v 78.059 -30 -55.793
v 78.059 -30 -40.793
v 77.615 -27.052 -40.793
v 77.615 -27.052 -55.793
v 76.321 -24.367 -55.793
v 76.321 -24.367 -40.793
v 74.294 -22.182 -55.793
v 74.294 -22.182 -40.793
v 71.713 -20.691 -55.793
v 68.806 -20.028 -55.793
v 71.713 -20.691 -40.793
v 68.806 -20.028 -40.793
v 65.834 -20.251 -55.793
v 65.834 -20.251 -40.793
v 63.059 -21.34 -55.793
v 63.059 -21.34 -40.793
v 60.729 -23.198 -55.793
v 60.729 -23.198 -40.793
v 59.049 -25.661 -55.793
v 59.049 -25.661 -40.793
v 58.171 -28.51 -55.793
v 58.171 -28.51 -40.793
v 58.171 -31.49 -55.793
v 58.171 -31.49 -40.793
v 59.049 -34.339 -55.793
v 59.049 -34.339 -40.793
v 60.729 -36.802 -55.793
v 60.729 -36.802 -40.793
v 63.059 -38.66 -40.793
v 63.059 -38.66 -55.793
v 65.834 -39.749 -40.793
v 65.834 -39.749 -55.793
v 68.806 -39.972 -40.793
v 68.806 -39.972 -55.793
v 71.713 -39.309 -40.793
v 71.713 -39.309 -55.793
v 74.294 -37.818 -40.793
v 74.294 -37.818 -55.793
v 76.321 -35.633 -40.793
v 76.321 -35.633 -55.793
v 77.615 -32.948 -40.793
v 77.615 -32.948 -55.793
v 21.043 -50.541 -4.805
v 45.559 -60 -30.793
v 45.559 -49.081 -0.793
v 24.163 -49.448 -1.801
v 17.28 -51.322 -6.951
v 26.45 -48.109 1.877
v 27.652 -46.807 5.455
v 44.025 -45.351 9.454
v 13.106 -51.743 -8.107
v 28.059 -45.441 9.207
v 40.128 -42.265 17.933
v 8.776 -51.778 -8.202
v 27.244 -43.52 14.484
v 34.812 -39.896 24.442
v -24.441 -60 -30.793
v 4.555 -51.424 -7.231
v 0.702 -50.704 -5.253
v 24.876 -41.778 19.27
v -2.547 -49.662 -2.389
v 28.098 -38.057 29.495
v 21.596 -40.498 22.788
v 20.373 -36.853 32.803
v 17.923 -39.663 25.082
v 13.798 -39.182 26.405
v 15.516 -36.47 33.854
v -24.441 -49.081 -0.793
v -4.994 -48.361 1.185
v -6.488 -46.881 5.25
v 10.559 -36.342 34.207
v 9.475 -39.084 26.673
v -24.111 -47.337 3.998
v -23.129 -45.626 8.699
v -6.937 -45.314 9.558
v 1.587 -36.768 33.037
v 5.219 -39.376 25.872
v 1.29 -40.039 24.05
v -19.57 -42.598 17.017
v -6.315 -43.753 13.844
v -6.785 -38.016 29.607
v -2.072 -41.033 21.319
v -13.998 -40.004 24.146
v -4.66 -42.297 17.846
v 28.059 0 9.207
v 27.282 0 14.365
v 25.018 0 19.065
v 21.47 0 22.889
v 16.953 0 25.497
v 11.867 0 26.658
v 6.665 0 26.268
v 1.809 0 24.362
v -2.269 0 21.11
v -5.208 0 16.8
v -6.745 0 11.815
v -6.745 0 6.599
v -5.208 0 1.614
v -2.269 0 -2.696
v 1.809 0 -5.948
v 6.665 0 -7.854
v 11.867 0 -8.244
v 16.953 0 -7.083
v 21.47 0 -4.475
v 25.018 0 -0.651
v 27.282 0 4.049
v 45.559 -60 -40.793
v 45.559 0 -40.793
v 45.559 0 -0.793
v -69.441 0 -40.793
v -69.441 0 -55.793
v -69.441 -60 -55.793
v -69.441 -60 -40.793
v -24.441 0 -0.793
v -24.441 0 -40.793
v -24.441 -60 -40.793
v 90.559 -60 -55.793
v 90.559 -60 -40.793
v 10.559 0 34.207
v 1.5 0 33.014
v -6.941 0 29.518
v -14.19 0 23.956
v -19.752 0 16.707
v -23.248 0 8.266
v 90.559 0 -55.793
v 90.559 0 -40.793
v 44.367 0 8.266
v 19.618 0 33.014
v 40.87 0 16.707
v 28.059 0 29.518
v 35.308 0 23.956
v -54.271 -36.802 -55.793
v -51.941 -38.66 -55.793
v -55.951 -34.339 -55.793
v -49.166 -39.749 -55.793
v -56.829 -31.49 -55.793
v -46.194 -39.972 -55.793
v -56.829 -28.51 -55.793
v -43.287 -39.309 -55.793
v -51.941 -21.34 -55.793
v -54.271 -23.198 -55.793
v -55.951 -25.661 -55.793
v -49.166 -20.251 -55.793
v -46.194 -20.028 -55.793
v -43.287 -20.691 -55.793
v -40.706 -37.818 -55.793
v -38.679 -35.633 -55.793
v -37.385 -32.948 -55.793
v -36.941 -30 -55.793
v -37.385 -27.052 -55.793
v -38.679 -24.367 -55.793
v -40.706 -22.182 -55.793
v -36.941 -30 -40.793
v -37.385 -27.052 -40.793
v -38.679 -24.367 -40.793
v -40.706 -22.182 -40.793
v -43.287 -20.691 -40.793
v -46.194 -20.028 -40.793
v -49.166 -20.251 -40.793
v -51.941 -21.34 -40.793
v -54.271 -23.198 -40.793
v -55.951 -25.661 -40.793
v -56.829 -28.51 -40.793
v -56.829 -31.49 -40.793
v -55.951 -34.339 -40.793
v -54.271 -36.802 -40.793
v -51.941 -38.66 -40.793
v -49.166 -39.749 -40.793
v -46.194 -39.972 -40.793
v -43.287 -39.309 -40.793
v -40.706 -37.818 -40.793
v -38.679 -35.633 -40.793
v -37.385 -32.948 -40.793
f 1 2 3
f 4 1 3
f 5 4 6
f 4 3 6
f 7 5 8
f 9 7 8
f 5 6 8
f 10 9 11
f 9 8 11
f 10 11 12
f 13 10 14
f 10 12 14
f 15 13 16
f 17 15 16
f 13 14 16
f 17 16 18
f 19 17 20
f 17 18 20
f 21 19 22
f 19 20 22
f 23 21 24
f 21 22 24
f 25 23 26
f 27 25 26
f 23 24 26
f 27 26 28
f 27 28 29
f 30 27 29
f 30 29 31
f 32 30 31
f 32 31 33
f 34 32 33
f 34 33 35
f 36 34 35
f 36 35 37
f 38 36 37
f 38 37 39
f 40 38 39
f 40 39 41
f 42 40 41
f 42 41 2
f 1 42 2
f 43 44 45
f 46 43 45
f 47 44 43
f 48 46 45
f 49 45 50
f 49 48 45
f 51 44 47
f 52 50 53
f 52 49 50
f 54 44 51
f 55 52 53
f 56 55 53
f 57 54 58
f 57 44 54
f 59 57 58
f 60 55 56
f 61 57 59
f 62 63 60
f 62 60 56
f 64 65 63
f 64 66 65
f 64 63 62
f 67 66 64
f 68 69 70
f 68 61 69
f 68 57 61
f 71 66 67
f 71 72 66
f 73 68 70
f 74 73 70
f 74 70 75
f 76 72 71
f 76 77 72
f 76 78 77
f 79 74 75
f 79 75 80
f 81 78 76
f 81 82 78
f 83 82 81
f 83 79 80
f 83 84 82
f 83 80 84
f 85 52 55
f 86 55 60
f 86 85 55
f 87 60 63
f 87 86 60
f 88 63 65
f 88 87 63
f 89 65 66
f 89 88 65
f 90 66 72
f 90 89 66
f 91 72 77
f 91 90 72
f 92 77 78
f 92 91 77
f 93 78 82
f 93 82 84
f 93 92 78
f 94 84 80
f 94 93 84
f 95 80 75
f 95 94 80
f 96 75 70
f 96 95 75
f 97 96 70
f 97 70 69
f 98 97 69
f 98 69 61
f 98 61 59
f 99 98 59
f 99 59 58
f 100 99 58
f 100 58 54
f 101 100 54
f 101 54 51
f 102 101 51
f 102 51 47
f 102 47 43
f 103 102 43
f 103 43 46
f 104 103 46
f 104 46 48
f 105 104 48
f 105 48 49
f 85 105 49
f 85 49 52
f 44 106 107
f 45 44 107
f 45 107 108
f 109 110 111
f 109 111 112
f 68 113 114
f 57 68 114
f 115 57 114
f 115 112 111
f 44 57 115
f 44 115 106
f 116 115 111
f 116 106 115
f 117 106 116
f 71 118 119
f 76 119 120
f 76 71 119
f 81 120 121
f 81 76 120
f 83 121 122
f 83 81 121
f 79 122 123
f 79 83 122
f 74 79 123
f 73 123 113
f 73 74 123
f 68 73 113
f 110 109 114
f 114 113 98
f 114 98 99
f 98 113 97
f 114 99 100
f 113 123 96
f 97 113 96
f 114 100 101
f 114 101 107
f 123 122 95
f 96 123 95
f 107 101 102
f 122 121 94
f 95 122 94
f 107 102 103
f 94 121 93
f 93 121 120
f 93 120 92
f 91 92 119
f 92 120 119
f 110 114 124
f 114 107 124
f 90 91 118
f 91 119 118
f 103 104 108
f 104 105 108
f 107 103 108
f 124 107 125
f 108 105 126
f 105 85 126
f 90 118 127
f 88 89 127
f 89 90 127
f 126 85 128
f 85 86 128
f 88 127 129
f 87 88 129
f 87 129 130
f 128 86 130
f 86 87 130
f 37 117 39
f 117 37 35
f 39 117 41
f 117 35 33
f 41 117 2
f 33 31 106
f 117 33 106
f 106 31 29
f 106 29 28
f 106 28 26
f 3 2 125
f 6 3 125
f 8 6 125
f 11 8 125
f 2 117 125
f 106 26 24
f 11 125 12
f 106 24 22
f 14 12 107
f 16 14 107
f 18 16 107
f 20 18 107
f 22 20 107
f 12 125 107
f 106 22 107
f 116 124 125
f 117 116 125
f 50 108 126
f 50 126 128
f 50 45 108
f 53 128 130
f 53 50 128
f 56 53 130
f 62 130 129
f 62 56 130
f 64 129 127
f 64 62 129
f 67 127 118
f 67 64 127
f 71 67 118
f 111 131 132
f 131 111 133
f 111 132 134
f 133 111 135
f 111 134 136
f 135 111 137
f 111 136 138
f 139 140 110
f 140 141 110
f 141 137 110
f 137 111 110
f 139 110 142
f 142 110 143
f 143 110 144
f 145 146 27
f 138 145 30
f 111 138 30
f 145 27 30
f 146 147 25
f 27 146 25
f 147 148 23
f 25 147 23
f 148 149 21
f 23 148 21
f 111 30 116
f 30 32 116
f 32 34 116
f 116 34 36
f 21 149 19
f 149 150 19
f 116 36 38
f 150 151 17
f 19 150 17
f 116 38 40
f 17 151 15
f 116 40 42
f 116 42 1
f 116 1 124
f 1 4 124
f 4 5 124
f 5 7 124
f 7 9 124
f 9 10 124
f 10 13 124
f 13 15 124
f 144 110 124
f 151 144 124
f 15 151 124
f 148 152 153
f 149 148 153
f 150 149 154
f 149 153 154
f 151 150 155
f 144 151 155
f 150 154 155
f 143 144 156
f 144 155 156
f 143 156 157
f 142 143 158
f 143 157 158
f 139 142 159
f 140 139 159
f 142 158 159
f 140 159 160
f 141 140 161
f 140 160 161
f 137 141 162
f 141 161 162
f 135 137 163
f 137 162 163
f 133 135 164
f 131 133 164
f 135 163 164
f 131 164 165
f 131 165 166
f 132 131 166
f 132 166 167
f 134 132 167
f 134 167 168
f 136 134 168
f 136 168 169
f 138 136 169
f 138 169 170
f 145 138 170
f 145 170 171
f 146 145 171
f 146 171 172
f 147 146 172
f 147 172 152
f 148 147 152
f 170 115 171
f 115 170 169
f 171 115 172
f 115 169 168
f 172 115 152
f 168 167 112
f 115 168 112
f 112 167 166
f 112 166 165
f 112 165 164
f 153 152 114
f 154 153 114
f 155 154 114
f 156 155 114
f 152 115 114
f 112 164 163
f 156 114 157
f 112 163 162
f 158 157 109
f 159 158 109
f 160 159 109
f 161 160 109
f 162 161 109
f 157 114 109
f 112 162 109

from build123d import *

# Parameters (mm, degrees)
F0_W        = 22.5
F0_H        = 15
F0_R        = 17.5
F1_DEPTH    = 60
F2_R        = 10
F3_DEPTH    = 75.9
F4_T1_DEPTH = 407.2453152316
F5_R        = 34.99999


# Not quite as in the source:
# - a fillet or chamfer that OpenCascade refuses, or shapes differently, is made with other operations: its cross-section is extruded or revolved along the edge and cut away or added
# - a fillet or chamfer is up to 0.001 mm smaller than in the source, because OpenCascade refuses the exact size


with BuildPart() as f1:
    # F0 (on Front) → F1 (new body)
    with BuildSketch(Plane.XZ):
        Polygon((-24.4408938289, -40.7930500805), (10.5591061711, -40.7930500805), (13.0723165348, -40.7930500805), (45.5591061711, -40.7930500805), (45.5591061711, -35.7930500805), (-24.4408938289, -35.7930500805), align=None)
        Polygon((13.0723165348, -40.7930500805), (10.5591061711, -40.7930500805), (-24.4408938289, -40.7930500805), (-46.9408938289, -40.7930500805), (-46.9408938289, -55.7930500805), (68.0591061711, -55.7930500805), (68.0591061711, -40.7930500805), (45.5591061711, -40.7930500805), align=None)
        with Locations((-58.1908938289, -48.2930500805)):
            Rectangle(F0_W, F0_H)
        Polygon((-24.4408938289, 9.2069499195), (-24.4408938289, -35.7930500805), (45.5591061711, -35.7930500805), (45.5591061711, 9.2069499195), (45.5591061711, 34.2069499195), (-24.4408938289, 34.2069499195), align=None)
        with Locations((10.5591061711, 9.2069499195)):
            Circle(F0_R, mode=Mode.SUBTRACT)
        with Locations((79.3091061711, -48.2930500805)):
            Rectangle(F0_W, F0_H)
    extrude(amount=F1_DEPTH)

    # F2 (on Top) → F3 (cut)
    with BuildSketch(Plane.XY):
        with Locations((-46.9408938289, -30)):
            Circle(F2_R)
        with Locations((68.0591061711, -30)):
            Circle(F2_R)
    extrude(amount=-F3_DEPTH, mode=Mode.SUBTRACT)

    # F4: chamfer of 65 x 23.6580652273 on 1 edges, made by hand

    # F4_s2 → F4_t1 (cut)
    with BuildSketch(Plane.YZ.offset(-193.0635514447)):
        Polygon((-60, -30.7930500805), (-36.3419347727, 34.2069499195), (-60, 34.2069499195), align=None)
    extrude(amount=F4_T1_DEPTH, mode=Mode.SUBTRACT)

    # F5 (radius 35 in the source; OpenCascade refuses exactly that, so slightly less here)
    f5_edges = [f1.edges().sort_by_distance(p)[0] for p in [
        (45.559106, -18.170967, 34.20695),
        (-24.440894, -18.170967, 34.20695),
    ]]
    fillet(f5_edges, radius=F5_R)


solid = f1.part
